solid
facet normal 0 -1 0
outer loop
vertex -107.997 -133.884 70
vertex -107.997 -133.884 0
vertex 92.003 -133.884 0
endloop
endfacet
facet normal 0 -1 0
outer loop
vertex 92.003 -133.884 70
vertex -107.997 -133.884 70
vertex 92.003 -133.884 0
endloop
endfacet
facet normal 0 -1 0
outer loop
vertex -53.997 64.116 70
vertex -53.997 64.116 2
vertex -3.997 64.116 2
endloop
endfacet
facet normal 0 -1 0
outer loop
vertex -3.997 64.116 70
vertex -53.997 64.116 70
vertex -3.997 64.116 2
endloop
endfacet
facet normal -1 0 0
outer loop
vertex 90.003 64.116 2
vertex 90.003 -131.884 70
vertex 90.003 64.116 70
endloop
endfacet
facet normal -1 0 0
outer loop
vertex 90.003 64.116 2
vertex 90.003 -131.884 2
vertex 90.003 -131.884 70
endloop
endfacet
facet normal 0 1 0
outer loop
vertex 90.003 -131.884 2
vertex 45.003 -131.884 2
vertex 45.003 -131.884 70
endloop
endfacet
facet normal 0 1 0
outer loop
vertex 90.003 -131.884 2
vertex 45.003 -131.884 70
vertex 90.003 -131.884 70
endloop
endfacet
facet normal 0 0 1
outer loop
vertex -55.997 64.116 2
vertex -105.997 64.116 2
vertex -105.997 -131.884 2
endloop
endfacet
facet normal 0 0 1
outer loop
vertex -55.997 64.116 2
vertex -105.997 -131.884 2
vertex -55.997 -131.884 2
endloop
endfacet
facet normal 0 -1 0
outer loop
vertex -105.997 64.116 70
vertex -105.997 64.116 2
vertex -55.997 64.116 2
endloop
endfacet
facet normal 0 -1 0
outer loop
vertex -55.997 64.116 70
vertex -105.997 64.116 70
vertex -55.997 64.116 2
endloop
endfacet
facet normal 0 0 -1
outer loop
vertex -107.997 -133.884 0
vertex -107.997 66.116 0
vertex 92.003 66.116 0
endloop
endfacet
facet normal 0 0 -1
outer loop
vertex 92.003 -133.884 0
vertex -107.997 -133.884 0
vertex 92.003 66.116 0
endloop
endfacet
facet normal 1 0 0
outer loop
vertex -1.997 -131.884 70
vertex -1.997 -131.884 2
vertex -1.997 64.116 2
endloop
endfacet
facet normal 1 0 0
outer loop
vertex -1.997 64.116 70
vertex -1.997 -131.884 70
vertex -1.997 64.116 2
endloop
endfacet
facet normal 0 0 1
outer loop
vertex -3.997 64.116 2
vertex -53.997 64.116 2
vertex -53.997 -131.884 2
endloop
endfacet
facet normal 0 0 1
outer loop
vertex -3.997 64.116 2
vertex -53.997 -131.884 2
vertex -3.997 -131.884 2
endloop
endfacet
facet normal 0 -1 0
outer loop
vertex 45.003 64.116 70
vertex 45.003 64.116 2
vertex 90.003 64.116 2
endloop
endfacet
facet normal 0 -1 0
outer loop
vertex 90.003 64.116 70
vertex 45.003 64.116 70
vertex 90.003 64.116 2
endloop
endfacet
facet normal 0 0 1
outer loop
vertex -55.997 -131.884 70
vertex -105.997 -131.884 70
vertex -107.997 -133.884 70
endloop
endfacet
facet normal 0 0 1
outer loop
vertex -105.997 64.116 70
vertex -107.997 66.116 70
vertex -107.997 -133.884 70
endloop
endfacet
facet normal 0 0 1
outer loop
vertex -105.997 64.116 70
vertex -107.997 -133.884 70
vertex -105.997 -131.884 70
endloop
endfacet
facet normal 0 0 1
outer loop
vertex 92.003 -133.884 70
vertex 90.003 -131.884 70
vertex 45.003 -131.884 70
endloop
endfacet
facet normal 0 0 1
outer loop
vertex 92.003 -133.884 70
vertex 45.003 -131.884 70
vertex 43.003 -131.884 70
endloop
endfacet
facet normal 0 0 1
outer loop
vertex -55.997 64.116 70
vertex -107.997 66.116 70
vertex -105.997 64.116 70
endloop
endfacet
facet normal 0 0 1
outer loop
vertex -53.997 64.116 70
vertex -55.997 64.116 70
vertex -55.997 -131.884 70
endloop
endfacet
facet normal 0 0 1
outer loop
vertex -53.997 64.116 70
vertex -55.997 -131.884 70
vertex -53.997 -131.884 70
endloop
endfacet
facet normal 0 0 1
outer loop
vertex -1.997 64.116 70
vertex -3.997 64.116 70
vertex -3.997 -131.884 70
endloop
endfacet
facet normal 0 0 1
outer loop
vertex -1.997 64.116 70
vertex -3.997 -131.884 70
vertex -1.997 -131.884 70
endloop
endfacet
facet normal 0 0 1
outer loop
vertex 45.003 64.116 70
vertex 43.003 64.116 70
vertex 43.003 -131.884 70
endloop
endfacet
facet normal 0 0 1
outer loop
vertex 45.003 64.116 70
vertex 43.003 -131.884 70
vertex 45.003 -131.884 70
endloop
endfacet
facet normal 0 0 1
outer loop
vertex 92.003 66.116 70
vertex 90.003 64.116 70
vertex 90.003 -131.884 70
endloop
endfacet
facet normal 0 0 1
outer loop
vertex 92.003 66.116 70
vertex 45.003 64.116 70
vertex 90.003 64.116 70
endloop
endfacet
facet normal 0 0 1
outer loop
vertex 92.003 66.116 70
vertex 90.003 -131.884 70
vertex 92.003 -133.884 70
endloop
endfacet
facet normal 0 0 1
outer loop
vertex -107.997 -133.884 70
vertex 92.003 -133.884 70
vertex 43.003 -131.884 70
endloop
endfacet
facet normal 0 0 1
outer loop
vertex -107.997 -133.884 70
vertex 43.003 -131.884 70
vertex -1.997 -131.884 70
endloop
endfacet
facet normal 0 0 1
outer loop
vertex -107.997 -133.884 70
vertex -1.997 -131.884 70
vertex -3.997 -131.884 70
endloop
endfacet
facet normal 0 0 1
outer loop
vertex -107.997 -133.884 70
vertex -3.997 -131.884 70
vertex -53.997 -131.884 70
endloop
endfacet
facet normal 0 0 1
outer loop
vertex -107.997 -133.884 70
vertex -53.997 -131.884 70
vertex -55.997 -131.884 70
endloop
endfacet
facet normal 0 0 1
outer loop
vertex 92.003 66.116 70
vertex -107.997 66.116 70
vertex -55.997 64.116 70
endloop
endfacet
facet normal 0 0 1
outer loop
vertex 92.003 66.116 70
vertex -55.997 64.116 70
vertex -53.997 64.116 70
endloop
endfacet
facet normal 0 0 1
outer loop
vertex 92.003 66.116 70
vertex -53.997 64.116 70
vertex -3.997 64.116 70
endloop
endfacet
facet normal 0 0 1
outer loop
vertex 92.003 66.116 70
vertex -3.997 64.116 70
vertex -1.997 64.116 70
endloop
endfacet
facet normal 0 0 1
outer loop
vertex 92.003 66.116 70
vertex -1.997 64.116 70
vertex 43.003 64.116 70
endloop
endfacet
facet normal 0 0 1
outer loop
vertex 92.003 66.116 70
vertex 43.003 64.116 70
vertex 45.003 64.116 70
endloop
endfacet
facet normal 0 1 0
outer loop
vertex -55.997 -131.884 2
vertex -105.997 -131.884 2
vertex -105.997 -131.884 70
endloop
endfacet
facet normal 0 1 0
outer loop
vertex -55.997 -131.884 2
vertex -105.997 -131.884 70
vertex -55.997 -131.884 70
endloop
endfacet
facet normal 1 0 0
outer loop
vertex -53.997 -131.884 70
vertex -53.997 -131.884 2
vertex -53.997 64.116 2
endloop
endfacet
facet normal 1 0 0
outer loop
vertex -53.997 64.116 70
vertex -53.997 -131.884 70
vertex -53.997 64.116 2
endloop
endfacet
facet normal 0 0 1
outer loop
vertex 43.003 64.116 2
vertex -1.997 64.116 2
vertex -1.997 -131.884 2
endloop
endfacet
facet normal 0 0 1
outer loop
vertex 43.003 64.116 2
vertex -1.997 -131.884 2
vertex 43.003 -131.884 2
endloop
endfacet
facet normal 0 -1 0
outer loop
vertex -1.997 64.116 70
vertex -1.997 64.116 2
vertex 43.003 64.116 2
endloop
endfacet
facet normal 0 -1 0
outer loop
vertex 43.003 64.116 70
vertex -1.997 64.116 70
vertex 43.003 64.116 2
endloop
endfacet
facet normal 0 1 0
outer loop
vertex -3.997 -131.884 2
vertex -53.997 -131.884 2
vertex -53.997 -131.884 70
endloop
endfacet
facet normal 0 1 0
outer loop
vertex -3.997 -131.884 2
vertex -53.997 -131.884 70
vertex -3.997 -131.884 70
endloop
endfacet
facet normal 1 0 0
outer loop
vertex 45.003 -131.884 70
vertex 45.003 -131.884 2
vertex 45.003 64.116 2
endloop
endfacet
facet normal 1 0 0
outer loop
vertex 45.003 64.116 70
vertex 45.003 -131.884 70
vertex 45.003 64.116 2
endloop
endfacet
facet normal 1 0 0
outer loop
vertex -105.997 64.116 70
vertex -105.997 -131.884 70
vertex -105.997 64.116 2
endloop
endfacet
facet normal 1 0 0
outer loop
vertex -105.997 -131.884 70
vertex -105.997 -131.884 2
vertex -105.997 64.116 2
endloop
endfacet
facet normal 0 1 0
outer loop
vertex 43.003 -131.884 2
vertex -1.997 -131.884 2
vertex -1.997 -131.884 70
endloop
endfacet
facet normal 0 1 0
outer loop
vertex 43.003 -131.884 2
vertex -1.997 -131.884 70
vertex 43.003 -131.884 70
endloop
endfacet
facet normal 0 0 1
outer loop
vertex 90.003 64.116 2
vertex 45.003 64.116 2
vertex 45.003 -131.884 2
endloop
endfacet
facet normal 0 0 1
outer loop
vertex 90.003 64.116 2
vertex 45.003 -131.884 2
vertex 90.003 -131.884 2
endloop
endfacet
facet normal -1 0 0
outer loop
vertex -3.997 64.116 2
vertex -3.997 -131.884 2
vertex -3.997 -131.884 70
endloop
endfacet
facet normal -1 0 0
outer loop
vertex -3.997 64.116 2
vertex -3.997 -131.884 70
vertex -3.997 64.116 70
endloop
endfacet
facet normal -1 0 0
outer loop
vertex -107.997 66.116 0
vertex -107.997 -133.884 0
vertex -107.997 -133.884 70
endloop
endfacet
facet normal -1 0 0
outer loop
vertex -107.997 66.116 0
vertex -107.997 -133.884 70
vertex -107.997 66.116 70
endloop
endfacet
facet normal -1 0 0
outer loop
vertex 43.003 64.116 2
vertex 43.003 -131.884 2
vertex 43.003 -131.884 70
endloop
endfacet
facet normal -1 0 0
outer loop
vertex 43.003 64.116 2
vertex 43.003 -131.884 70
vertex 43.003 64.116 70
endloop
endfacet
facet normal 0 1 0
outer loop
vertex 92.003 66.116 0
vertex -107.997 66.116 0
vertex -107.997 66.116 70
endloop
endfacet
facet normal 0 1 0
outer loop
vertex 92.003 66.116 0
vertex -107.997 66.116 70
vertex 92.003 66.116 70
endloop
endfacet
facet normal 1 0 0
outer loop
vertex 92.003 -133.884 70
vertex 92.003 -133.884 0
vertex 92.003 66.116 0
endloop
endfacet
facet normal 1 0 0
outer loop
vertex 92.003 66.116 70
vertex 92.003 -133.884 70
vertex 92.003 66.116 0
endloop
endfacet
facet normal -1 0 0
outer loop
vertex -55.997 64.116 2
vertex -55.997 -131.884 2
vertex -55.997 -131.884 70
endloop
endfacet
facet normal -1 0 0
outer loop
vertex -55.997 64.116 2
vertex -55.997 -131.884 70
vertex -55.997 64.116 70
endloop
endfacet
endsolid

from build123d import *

# Parameters (mm, degrees)
F0_W     = 200
F0_H     = 200
F1_DEPTH = 70
F2_T     = -2
F3_W     = 2
F3_H     = 196
F4_DEPTH = 68


with BuildPart() as f1:
    # F0 (on Top) → F1 (new body)
    with BuildSketch(Plane.XY):
        with Locations((-7.9974851012, -33.8844692809)):
            Rectangle(F0_W, F0_H)
    extrude(amount=F1_DEPTH)

    # F2
    f2_openings = [f1.faces().sort_by_distance(p)[0] for p in [
        (-7.997485, -33.884469, 70),
    ]]
    offset(amount=F2_T, openings=f2_openings)

    # F3 (on face) → F4 (join)
    with BuildSketch(Plane.XY.offset(2)):
        with Locations((-54.9974851012, -33.8844692809)):
            Rectangle(F3_W, F3_H)
        with Locations((-2.9974851012, -33.8844692809)):
            Rectangle(F3_W, F3_H)
        with Locations((44.0025148988, -33.8844692809)):
            Rectangle(F3_W, F3_H)
    extrude(amount=F4_DEPTH)


solid = f1.part
